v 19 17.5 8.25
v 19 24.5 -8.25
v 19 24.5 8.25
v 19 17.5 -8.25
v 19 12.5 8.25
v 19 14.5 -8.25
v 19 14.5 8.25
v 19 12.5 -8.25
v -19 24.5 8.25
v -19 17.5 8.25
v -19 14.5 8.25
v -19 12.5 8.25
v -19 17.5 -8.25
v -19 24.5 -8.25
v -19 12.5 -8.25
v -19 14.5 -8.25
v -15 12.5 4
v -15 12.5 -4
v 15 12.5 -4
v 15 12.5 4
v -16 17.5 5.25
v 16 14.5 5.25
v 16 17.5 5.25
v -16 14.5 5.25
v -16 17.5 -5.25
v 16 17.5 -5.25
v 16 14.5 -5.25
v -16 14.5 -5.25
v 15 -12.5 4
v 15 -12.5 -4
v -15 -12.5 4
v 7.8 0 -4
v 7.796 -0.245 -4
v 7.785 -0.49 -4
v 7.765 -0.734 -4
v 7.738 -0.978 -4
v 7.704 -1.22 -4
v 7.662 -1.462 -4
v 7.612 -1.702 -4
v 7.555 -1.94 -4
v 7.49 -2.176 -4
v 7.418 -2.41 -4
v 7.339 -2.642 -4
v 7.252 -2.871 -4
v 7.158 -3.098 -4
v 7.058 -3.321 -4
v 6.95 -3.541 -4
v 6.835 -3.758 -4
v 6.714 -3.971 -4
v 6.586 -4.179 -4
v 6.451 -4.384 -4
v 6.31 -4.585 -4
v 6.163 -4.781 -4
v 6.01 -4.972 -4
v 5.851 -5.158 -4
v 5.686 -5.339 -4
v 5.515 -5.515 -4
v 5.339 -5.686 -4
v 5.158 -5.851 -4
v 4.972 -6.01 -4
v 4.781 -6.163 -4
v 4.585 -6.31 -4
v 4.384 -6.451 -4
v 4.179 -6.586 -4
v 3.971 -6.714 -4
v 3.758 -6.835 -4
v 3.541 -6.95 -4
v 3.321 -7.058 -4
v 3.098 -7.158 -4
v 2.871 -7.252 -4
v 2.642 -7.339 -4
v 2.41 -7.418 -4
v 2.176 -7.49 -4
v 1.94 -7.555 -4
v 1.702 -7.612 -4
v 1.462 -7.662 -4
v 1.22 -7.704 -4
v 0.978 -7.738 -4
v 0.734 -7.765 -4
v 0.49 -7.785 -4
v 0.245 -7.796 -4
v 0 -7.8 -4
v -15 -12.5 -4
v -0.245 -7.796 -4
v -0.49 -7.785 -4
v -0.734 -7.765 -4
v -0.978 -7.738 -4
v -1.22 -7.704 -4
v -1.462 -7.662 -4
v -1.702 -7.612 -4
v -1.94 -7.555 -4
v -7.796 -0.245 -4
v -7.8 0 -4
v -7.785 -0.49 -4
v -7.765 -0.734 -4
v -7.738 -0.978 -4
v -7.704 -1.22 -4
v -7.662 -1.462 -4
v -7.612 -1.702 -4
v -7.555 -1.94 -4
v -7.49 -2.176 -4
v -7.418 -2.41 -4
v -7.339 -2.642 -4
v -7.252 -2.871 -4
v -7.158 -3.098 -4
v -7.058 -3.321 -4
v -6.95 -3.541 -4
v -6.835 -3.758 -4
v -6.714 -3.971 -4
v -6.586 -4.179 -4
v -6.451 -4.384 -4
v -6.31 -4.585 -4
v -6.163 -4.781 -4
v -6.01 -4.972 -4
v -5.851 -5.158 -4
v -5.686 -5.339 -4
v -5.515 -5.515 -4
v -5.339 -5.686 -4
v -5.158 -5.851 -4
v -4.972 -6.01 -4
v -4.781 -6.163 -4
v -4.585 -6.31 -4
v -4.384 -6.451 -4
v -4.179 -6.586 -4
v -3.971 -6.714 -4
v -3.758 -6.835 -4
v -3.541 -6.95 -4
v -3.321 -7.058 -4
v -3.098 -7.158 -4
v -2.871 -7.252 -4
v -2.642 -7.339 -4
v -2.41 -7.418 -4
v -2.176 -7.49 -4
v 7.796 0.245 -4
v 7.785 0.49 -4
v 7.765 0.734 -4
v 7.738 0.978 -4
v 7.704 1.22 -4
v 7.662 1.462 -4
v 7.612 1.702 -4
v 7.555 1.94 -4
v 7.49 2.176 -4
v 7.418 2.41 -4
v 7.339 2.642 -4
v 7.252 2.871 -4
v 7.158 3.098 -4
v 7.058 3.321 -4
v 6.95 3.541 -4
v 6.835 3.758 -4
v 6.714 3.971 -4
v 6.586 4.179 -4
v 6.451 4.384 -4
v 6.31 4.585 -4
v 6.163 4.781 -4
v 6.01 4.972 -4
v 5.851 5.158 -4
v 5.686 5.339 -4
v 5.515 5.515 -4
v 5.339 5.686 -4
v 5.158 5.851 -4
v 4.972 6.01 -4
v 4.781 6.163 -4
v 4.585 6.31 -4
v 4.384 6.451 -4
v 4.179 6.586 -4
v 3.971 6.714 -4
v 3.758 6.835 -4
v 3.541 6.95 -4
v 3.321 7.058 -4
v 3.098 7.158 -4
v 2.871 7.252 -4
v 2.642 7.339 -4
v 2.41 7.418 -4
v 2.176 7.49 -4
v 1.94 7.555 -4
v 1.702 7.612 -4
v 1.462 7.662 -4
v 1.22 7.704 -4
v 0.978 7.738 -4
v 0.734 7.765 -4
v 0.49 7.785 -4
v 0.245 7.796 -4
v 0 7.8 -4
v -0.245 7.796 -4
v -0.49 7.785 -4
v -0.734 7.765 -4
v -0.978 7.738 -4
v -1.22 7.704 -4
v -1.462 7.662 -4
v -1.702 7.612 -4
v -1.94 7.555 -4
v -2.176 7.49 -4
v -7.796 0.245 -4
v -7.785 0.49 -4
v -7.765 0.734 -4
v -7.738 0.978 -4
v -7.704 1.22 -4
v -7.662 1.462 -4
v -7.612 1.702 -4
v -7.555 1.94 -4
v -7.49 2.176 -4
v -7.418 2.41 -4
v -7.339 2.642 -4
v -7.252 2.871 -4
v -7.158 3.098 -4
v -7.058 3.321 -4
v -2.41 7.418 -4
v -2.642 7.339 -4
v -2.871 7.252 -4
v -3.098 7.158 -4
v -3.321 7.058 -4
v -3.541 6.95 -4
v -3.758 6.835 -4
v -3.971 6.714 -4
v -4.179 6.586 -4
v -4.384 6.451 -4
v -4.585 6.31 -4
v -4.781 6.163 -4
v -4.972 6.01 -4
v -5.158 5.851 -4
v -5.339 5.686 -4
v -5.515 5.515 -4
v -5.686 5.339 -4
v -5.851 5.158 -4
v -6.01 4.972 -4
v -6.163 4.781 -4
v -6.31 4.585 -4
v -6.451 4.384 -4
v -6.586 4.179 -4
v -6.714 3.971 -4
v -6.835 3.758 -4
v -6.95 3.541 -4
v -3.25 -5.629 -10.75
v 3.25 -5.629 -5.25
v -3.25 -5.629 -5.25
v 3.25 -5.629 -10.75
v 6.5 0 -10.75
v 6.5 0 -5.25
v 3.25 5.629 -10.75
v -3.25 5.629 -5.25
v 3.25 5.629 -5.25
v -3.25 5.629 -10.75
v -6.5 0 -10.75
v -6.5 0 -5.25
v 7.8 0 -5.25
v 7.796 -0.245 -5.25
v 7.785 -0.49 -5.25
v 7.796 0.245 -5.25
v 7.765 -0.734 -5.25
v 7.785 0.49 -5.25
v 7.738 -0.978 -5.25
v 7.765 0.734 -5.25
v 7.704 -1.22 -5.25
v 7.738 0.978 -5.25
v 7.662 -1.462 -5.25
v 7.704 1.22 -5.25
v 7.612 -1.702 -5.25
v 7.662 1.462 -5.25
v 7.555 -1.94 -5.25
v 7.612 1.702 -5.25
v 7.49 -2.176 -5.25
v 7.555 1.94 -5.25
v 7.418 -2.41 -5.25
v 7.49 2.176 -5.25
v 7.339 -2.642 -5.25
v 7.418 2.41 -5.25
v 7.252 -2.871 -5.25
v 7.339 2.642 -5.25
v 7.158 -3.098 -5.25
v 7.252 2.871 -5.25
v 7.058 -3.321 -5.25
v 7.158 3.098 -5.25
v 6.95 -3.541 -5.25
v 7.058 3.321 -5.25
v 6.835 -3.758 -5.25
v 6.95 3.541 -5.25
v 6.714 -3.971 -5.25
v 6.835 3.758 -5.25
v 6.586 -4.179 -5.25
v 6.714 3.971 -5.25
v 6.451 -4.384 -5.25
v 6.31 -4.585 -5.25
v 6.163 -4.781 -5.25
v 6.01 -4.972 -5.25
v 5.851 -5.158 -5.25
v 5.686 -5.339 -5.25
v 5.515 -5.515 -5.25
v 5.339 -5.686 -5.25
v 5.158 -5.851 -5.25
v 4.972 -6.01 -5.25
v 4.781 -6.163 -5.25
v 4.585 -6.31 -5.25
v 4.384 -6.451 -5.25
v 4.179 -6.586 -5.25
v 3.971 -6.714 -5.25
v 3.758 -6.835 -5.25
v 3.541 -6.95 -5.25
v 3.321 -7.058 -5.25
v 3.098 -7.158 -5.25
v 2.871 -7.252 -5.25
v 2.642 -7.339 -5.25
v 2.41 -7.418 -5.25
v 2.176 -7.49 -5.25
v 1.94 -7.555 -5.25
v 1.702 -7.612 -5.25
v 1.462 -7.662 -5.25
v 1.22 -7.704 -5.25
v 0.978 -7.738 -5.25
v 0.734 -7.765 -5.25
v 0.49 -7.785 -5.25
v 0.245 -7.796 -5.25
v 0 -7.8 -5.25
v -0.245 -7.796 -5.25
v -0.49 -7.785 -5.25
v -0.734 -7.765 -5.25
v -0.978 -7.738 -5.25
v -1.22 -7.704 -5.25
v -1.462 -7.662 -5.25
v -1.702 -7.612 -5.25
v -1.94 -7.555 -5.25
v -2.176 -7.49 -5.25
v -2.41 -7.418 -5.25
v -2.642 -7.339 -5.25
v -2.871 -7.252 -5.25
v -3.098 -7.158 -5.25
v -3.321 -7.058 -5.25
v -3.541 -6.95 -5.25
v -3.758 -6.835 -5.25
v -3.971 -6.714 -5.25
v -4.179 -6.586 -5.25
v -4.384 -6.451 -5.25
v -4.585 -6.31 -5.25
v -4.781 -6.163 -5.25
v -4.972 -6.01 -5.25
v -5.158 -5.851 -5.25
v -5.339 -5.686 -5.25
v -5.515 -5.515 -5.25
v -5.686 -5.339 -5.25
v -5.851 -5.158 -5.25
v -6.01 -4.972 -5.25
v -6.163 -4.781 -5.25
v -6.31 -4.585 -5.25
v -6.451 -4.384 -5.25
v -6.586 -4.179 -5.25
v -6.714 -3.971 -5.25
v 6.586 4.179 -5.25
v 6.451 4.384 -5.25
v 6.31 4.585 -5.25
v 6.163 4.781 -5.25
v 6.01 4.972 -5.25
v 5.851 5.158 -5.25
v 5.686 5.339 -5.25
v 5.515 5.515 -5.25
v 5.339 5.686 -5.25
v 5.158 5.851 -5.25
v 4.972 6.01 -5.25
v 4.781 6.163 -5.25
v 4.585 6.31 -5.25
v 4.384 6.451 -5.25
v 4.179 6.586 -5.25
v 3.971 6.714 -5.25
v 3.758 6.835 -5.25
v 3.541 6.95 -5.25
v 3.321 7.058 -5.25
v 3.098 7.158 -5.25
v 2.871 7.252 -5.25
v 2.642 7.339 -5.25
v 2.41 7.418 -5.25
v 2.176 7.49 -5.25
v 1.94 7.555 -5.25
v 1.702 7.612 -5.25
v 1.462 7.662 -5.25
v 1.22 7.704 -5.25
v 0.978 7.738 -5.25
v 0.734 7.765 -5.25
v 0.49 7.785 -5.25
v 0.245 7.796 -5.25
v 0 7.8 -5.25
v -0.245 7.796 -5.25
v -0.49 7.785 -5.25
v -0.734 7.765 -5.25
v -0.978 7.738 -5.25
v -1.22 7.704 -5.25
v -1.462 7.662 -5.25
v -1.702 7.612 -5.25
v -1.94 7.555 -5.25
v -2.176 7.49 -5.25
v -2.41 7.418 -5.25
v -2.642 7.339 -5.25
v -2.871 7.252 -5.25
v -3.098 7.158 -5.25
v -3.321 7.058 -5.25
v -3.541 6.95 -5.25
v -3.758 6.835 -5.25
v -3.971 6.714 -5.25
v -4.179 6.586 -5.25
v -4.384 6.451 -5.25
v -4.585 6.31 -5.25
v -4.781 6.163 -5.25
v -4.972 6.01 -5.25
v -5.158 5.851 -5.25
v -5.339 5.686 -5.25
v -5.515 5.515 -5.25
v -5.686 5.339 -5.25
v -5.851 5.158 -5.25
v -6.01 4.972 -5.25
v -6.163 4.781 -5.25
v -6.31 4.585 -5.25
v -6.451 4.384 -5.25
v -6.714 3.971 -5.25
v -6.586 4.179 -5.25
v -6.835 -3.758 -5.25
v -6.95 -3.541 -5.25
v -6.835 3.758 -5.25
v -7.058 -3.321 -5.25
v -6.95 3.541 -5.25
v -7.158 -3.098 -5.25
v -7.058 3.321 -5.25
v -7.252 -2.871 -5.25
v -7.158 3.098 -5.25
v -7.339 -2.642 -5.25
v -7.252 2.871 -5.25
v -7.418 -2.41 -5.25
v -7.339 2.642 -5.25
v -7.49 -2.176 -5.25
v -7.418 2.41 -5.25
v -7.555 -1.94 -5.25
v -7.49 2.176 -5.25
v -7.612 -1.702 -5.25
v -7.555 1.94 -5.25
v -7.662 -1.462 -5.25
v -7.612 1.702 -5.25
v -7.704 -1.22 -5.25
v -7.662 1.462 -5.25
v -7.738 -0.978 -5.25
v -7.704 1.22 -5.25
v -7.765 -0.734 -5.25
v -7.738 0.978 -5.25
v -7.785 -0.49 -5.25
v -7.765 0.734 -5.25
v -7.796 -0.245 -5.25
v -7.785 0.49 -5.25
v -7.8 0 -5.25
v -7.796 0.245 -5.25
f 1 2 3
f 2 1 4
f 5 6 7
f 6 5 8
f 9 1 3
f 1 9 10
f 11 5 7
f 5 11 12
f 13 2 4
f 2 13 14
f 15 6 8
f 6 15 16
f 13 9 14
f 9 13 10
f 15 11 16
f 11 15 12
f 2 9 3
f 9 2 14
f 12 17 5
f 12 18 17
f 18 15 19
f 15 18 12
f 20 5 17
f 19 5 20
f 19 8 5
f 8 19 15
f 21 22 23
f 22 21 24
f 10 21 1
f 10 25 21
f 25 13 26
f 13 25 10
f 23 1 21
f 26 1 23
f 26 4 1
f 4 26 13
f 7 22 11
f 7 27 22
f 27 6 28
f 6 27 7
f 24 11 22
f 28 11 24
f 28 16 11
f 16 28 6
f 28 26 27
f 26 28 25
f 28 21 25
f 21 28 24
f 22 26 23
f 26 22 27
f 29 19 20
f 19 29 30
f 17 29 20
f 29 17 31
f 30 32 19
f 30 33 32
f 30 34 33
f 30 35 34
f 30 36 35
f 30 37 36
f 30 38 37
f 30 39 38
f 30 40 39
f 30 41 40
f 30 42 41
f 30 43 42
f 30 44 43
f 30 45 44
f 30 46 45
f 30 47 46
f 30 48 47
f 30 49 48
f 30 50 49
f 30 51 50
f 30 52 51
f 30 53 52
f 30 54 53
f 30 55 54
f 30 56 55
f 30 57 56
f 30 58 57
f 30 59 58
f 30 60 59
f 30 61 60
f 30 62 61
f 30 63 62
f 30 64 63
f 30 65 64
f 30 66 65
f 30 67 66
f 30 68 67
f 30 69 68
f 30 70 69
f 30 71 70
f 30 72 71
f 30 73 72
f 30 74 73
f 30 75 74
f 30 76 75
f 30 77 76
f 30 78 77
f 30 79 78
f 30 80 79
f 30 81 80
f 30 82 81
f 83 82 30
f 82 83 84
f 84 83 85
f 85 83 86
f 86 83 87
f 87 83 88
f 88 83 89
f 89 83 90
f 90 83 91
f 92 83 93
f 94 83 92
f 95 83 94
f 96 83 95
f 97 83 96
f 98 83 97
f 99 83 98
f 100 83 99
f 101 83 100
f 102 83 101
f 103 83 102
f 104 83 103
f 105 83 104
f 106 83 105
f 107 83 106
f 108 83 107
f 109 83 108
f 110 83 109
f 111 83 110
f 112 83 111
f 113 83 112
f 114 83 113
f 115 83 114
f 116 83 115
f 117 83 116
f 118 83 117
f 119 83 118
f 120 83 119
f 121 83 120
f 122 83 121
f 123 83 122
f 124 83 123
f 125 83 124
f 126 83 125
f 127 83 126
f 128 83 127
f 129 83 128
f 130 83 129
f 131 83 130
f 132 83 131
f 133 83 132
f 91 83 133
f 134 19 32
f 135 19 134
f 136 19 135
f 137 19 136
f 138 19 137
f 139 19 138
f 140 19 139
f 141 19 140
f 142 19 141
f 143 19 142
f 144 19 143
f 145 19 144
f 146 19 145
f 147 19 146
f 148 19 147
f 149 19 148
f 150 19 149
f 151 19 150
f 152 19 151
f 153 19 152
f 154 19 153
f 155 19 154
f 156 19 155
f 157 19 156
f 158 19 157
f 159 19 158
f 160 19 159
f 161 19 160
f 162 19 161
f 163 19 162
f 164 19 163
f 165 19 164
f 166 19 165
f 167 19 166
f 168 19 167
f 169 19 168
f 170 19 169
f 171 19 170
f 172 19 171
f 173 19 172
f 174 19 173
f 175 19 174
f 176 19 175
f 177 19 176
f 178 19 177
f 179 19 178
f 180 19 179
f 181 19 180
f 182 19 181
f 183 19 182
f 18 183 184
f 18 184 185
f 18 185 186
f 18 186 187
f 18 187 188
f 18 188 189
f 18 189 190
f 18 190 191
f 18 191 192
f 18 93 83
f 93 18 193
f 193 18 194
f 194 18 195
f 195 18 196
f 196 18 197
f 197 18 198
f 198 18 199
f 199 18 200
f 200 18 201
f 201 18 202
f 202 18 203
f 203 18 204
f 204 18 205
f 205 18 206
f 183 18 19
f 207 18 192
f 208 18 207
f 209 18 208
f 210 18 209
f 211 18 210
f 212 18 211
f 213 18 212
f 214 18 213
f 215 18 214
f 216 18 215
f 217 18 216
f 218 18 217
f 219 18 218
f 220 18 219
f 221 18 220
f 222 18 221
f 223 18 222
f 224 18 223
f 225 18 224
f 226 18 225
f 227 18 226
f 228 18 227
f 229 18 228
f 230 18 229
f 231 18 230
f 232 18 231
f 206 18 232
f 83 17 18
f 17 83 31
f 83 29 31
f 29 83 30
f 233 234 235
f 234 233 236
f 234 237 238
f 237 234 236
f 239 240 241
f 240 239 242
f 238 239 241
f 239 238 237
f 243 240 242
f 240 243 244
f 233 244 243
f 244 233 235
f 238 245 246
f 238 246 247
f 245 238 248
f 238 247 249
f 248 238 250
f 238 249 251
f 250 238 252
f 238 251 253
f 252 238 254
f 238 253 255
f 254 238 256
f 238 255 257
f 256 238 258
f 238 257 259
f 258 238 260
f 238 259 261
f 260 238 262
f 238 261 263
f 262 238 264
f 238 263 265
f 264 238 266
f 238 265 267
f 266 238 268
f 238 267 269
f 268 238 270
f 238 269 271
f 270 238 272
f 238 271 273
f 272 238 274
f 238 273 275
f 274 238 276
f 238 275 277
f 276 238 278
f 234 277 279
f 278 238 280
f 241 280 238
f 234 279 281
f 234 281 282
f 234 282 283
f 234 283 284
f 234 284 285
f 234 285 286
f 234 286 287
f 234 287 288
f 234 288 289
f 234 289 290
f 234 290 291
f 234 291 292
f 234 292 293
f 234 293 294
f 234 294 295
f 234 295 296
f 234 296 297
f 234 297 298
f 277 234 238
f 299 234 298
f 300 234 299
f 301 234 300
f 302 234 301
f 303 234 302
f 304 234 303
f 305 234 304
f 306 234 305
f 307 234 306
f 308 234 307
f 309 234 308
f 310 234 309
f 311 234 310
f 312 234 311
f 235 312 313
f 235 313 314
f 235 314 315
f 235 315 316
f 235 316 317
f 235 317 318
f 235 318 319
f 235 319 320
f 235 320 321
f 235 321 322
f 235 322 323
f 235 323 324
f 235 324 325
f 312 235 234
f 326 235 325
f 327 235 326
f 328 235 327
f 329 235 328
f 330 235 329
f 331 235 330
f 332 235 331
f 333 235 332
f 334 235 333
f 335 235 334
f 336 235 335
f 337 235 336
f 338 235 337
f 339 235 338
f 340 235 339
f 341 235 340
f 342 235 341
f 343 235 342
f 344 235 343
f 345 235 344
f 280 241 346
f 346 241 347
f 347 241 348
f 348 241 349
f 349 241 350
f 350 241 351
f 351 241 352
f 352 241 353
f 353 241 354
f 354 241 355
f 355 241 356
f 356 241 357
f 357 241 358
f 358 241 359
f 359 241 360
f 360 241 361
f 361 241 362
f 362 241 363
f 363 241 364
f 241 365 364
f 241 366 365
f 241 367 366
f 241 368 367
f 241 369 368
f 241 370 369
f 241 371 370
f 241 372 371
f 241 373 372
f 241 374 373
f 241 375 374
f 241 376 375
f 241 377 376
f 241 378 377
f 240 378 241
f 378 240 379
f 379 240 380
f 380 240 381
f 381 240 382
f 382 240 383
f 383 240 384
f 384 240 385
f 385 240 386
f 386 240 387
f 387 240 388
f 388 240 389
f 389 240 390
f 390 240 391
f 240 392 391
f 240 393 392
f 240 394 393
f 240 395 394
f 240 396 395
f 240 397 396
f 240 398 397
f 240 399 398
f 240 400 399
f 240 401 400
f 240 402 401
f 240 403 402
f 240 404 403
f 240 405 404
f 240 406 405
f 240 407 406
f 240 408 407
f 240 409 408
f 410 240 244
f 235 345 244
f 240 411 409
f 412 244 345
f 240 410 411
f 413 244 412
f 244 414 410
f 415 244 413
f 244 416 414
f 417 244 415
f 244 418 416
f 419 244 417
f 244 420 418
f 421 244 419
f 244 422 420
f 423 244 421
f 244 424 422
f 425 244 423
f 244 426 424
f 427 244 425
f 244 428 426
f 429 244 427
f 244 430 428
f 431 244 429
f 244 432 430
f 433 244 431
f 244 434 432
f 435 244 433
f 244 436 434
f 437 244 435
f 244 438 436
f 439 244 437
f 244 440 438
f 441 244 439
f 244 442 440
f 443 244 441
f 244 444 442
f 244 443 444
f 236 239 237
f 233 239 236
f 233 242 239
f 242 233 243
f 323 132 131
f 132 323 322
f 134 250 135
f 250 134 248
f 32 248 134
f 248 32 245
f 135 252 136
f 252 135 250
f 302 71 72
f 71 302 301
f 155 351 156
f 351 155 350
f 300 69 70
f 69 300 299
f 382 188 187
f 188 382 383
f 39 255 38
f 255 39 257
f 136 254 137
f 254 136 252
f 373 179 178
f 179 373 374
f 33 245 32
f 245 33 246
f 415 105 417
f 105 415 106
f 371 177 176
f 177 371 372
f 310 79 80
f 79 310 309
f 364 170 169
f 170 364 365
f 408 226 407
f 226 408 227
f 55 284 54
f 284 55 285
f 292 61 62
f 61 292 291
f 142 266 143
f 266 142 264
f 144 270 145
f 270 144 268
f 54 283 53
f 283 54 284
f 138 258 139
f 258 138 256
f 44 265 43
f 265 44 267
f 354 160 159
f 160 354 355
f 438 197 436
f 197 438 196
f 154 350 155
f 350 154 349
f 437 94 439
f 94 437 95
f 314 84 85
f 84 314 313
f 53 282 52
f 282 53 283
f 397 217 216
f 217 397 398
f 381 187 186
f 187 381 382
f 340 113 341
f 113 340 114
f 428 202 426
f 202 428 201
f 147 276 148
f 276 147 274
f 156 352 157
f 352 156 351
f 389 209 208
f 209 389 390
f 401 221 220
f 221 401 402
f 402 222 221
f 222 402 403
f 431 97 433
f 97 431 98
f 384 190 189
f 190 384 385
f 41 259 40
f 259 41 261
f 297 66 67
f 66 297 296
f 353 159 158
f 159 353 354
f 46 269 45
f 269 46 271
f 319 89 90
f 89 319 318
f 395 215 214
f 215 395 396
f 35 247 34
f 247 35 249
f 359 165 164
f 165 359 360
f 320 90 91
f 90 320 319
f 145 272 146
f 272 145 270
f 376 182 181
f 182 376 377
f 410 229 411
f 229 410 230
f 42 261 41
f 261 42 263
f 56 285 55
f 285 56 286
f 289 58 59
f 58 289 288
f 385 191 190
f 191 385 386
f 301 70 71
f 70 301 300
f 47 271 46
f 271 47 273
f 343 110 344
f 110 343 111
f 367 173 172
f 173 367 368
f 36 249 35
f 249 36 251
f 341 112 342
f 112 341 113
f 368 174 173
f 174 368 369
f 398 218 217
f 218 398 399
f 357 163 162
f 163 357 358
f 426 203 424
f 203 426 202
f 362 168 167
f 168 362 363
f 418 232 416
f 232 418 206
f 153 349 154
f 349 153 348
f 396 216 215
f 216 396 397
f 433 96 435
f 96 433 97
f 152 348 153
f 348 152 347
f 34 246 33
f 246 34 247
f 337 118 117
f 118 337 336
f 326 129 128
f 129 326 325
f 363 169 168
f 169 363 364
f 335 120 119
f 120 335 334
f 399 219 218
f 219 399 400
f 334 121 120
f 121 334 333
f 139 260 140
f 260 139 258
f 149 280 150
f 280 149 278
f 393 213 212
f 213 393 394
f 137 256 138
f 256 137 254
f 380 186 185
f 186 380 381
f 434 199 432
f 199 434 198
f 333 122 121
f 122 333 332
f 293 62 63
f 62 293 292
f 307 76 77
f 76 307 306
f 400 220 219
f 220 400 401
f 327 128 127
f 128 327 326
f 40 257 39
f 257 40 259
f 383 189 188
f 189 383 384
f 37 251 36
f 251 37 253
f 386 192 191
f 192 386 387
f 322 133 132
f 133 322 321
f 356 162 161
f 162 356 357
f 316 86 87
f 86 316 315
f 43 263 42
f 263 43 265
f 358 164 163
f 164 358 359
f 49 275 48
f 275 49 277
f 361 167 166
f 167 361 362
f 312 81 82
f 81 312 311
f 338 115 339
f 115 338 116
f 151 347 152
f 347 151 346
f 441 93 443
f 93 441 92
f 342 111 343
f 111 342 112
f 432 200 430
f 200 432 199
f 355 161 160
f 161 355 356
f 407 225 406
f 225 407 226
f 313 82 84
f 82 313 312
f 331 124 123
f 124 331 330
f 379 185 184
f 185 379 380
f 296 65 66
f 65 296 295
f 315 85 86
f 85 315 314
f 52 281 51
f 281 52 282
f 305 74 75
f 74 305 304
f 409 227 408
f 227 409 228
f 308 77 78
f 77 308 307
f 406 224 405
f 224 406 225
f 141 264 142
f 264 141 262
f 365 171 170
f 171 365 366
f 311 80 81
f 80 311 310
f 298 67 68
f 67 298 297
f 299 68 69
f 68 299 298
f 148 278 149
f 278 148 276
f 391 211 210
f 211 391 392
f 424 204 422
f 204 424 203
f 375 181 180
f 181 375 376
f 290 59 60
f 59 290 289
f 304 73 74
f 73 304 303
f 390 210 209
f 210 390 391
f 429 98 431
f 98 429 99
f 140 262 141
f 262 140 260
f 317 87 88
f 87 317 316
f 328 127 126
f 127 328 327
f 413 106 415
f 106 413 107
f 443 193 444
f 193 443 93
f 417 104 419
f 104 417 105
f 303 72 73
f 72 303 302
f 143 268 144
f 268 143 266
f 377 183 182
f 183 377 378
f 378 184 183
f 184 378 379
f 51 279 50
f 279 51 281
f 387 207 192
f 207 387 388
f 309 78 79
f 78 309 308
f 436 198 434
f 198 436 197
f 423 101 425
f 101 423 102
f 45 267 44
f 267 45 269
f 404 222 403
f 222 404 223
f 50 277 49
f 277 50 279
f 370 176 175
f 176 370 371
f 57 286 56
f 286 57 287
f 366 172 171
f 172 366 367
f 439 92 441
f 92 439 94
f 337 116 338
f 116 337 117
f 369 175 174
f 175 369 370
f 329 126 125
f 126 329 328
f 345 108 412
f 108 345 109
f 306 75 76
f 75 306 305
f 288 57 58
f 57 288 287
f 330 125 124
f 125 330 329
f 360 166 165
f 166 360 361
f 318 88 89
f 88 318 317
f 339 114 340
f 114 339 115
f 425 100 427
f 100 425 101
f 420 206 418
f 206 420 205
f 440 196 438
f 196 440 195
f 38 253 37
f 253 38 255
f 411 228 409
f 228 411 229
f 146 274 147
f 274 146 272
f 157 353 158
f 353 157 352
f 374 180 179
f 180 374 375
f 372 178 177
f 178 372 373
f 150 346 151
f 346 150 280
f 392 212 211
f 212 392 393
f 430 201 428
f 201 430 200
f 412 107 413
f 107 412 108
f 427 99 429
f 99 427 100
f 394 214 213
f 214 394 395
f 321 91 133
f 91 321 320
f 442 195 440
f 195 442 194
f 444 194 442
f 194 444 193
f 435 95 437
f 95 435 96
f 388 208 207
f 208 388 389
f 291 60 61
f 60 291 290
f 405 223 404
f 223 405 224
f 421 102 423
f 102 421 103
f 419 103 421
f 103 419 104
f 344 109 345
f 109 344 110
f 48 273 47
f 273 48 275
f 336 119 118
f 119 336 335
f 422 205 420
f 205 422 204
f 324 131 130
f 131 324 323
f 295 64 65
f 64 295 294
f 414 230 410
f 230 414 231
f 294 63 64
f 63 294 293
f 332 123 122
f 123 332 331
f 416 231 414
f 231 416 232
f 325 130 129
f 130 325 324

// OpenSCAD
/**

Terminal covers for Victron Lynx Power In

@idnorton

Licenced as Creative Commons Attribution Non Commercial 3.0
See https://creativecommons.org/licenses/by-nc/3.0/

Specifically you may not sell the design or products using the design.
You're welcome to use the design to build things for your own use :)

Perimiters: 4
Seam position: Random

**/

busbar_x = 30;
busbar_y = 25;
busbar_z = 8;
busbar_hole = 8.8;
busbar_hole_offset = 13.5;

insulator_x = 38;
insulator_y = 12;
insulator_z = 16.5;

insulator_groove_x = 34;
insulator_groove_y = 3;
insulator_groove_z = 12;
insulator_groove_inset = 2;

// Busbar
difference() {
    translate([0-(busbar_x/2), 0-(busbar_y/2), 0-(busbar_z/2)]) { cube([busbar_x, busbar_y, busbar_z]); }
    
    // Bolt hole
    //translate([0, 0, (busbar_z/2)]) { cylinder(h = busbar_z*2, d=8.8, center=true, $fn=200); }
}

// Bolt head
translate([0, 0, 0-(busbar_z/2)-4]) { cylinder(h = 5.5, d=13, center=true, $fn=6); }

// washer
translate([0, 0, 0-(busbar_z/2)-0.5]) { cylinder(h = 1.5, d=15.6, center=true, $fn=200); }


difference() {
    translate([0-(insulator_x/2), busbar_y/2, 0-(insulator_z/2)]) {
        cube([insulator_x, insulator_y, insulator_z]);
    }
    
    // Top groove
    translate([0-(insulator_x/2), busbar_y/2 + insulator_groove_inset, (insulator_z/2) - insulator_groove_y]) {
        cube([insulator_x, insulator_groove_y, insulator_groove_y]);
    }
    
    // Bottom groove
    translate([0-(insulator_x/2), busbar_y/2 + insulator_groove_inset, 0-(insulator_z/2)]) {
        cube([insulator_x, insulator_groove_y, insulator_groove_y]);
    }
    
    // Left groove
    translate([0-(insulator_x/2), busbar_y/2 + insulator_groove_inset, 0-(insulator_z/2)]) {
        cube([insulator_groove_y, insulator_groove_y, insulator_groove_z*2]);
    }
    
    // Right groove
    translate([insulator_x/2-insulator_groove_y, busbar_y/2 + insulator_groove_inset, 0-(insulator_z/2)]) {
        cube([insulator_groove_y, insulator_groove_y, insulator_groove_z*2]);
    }    
    
    
}
